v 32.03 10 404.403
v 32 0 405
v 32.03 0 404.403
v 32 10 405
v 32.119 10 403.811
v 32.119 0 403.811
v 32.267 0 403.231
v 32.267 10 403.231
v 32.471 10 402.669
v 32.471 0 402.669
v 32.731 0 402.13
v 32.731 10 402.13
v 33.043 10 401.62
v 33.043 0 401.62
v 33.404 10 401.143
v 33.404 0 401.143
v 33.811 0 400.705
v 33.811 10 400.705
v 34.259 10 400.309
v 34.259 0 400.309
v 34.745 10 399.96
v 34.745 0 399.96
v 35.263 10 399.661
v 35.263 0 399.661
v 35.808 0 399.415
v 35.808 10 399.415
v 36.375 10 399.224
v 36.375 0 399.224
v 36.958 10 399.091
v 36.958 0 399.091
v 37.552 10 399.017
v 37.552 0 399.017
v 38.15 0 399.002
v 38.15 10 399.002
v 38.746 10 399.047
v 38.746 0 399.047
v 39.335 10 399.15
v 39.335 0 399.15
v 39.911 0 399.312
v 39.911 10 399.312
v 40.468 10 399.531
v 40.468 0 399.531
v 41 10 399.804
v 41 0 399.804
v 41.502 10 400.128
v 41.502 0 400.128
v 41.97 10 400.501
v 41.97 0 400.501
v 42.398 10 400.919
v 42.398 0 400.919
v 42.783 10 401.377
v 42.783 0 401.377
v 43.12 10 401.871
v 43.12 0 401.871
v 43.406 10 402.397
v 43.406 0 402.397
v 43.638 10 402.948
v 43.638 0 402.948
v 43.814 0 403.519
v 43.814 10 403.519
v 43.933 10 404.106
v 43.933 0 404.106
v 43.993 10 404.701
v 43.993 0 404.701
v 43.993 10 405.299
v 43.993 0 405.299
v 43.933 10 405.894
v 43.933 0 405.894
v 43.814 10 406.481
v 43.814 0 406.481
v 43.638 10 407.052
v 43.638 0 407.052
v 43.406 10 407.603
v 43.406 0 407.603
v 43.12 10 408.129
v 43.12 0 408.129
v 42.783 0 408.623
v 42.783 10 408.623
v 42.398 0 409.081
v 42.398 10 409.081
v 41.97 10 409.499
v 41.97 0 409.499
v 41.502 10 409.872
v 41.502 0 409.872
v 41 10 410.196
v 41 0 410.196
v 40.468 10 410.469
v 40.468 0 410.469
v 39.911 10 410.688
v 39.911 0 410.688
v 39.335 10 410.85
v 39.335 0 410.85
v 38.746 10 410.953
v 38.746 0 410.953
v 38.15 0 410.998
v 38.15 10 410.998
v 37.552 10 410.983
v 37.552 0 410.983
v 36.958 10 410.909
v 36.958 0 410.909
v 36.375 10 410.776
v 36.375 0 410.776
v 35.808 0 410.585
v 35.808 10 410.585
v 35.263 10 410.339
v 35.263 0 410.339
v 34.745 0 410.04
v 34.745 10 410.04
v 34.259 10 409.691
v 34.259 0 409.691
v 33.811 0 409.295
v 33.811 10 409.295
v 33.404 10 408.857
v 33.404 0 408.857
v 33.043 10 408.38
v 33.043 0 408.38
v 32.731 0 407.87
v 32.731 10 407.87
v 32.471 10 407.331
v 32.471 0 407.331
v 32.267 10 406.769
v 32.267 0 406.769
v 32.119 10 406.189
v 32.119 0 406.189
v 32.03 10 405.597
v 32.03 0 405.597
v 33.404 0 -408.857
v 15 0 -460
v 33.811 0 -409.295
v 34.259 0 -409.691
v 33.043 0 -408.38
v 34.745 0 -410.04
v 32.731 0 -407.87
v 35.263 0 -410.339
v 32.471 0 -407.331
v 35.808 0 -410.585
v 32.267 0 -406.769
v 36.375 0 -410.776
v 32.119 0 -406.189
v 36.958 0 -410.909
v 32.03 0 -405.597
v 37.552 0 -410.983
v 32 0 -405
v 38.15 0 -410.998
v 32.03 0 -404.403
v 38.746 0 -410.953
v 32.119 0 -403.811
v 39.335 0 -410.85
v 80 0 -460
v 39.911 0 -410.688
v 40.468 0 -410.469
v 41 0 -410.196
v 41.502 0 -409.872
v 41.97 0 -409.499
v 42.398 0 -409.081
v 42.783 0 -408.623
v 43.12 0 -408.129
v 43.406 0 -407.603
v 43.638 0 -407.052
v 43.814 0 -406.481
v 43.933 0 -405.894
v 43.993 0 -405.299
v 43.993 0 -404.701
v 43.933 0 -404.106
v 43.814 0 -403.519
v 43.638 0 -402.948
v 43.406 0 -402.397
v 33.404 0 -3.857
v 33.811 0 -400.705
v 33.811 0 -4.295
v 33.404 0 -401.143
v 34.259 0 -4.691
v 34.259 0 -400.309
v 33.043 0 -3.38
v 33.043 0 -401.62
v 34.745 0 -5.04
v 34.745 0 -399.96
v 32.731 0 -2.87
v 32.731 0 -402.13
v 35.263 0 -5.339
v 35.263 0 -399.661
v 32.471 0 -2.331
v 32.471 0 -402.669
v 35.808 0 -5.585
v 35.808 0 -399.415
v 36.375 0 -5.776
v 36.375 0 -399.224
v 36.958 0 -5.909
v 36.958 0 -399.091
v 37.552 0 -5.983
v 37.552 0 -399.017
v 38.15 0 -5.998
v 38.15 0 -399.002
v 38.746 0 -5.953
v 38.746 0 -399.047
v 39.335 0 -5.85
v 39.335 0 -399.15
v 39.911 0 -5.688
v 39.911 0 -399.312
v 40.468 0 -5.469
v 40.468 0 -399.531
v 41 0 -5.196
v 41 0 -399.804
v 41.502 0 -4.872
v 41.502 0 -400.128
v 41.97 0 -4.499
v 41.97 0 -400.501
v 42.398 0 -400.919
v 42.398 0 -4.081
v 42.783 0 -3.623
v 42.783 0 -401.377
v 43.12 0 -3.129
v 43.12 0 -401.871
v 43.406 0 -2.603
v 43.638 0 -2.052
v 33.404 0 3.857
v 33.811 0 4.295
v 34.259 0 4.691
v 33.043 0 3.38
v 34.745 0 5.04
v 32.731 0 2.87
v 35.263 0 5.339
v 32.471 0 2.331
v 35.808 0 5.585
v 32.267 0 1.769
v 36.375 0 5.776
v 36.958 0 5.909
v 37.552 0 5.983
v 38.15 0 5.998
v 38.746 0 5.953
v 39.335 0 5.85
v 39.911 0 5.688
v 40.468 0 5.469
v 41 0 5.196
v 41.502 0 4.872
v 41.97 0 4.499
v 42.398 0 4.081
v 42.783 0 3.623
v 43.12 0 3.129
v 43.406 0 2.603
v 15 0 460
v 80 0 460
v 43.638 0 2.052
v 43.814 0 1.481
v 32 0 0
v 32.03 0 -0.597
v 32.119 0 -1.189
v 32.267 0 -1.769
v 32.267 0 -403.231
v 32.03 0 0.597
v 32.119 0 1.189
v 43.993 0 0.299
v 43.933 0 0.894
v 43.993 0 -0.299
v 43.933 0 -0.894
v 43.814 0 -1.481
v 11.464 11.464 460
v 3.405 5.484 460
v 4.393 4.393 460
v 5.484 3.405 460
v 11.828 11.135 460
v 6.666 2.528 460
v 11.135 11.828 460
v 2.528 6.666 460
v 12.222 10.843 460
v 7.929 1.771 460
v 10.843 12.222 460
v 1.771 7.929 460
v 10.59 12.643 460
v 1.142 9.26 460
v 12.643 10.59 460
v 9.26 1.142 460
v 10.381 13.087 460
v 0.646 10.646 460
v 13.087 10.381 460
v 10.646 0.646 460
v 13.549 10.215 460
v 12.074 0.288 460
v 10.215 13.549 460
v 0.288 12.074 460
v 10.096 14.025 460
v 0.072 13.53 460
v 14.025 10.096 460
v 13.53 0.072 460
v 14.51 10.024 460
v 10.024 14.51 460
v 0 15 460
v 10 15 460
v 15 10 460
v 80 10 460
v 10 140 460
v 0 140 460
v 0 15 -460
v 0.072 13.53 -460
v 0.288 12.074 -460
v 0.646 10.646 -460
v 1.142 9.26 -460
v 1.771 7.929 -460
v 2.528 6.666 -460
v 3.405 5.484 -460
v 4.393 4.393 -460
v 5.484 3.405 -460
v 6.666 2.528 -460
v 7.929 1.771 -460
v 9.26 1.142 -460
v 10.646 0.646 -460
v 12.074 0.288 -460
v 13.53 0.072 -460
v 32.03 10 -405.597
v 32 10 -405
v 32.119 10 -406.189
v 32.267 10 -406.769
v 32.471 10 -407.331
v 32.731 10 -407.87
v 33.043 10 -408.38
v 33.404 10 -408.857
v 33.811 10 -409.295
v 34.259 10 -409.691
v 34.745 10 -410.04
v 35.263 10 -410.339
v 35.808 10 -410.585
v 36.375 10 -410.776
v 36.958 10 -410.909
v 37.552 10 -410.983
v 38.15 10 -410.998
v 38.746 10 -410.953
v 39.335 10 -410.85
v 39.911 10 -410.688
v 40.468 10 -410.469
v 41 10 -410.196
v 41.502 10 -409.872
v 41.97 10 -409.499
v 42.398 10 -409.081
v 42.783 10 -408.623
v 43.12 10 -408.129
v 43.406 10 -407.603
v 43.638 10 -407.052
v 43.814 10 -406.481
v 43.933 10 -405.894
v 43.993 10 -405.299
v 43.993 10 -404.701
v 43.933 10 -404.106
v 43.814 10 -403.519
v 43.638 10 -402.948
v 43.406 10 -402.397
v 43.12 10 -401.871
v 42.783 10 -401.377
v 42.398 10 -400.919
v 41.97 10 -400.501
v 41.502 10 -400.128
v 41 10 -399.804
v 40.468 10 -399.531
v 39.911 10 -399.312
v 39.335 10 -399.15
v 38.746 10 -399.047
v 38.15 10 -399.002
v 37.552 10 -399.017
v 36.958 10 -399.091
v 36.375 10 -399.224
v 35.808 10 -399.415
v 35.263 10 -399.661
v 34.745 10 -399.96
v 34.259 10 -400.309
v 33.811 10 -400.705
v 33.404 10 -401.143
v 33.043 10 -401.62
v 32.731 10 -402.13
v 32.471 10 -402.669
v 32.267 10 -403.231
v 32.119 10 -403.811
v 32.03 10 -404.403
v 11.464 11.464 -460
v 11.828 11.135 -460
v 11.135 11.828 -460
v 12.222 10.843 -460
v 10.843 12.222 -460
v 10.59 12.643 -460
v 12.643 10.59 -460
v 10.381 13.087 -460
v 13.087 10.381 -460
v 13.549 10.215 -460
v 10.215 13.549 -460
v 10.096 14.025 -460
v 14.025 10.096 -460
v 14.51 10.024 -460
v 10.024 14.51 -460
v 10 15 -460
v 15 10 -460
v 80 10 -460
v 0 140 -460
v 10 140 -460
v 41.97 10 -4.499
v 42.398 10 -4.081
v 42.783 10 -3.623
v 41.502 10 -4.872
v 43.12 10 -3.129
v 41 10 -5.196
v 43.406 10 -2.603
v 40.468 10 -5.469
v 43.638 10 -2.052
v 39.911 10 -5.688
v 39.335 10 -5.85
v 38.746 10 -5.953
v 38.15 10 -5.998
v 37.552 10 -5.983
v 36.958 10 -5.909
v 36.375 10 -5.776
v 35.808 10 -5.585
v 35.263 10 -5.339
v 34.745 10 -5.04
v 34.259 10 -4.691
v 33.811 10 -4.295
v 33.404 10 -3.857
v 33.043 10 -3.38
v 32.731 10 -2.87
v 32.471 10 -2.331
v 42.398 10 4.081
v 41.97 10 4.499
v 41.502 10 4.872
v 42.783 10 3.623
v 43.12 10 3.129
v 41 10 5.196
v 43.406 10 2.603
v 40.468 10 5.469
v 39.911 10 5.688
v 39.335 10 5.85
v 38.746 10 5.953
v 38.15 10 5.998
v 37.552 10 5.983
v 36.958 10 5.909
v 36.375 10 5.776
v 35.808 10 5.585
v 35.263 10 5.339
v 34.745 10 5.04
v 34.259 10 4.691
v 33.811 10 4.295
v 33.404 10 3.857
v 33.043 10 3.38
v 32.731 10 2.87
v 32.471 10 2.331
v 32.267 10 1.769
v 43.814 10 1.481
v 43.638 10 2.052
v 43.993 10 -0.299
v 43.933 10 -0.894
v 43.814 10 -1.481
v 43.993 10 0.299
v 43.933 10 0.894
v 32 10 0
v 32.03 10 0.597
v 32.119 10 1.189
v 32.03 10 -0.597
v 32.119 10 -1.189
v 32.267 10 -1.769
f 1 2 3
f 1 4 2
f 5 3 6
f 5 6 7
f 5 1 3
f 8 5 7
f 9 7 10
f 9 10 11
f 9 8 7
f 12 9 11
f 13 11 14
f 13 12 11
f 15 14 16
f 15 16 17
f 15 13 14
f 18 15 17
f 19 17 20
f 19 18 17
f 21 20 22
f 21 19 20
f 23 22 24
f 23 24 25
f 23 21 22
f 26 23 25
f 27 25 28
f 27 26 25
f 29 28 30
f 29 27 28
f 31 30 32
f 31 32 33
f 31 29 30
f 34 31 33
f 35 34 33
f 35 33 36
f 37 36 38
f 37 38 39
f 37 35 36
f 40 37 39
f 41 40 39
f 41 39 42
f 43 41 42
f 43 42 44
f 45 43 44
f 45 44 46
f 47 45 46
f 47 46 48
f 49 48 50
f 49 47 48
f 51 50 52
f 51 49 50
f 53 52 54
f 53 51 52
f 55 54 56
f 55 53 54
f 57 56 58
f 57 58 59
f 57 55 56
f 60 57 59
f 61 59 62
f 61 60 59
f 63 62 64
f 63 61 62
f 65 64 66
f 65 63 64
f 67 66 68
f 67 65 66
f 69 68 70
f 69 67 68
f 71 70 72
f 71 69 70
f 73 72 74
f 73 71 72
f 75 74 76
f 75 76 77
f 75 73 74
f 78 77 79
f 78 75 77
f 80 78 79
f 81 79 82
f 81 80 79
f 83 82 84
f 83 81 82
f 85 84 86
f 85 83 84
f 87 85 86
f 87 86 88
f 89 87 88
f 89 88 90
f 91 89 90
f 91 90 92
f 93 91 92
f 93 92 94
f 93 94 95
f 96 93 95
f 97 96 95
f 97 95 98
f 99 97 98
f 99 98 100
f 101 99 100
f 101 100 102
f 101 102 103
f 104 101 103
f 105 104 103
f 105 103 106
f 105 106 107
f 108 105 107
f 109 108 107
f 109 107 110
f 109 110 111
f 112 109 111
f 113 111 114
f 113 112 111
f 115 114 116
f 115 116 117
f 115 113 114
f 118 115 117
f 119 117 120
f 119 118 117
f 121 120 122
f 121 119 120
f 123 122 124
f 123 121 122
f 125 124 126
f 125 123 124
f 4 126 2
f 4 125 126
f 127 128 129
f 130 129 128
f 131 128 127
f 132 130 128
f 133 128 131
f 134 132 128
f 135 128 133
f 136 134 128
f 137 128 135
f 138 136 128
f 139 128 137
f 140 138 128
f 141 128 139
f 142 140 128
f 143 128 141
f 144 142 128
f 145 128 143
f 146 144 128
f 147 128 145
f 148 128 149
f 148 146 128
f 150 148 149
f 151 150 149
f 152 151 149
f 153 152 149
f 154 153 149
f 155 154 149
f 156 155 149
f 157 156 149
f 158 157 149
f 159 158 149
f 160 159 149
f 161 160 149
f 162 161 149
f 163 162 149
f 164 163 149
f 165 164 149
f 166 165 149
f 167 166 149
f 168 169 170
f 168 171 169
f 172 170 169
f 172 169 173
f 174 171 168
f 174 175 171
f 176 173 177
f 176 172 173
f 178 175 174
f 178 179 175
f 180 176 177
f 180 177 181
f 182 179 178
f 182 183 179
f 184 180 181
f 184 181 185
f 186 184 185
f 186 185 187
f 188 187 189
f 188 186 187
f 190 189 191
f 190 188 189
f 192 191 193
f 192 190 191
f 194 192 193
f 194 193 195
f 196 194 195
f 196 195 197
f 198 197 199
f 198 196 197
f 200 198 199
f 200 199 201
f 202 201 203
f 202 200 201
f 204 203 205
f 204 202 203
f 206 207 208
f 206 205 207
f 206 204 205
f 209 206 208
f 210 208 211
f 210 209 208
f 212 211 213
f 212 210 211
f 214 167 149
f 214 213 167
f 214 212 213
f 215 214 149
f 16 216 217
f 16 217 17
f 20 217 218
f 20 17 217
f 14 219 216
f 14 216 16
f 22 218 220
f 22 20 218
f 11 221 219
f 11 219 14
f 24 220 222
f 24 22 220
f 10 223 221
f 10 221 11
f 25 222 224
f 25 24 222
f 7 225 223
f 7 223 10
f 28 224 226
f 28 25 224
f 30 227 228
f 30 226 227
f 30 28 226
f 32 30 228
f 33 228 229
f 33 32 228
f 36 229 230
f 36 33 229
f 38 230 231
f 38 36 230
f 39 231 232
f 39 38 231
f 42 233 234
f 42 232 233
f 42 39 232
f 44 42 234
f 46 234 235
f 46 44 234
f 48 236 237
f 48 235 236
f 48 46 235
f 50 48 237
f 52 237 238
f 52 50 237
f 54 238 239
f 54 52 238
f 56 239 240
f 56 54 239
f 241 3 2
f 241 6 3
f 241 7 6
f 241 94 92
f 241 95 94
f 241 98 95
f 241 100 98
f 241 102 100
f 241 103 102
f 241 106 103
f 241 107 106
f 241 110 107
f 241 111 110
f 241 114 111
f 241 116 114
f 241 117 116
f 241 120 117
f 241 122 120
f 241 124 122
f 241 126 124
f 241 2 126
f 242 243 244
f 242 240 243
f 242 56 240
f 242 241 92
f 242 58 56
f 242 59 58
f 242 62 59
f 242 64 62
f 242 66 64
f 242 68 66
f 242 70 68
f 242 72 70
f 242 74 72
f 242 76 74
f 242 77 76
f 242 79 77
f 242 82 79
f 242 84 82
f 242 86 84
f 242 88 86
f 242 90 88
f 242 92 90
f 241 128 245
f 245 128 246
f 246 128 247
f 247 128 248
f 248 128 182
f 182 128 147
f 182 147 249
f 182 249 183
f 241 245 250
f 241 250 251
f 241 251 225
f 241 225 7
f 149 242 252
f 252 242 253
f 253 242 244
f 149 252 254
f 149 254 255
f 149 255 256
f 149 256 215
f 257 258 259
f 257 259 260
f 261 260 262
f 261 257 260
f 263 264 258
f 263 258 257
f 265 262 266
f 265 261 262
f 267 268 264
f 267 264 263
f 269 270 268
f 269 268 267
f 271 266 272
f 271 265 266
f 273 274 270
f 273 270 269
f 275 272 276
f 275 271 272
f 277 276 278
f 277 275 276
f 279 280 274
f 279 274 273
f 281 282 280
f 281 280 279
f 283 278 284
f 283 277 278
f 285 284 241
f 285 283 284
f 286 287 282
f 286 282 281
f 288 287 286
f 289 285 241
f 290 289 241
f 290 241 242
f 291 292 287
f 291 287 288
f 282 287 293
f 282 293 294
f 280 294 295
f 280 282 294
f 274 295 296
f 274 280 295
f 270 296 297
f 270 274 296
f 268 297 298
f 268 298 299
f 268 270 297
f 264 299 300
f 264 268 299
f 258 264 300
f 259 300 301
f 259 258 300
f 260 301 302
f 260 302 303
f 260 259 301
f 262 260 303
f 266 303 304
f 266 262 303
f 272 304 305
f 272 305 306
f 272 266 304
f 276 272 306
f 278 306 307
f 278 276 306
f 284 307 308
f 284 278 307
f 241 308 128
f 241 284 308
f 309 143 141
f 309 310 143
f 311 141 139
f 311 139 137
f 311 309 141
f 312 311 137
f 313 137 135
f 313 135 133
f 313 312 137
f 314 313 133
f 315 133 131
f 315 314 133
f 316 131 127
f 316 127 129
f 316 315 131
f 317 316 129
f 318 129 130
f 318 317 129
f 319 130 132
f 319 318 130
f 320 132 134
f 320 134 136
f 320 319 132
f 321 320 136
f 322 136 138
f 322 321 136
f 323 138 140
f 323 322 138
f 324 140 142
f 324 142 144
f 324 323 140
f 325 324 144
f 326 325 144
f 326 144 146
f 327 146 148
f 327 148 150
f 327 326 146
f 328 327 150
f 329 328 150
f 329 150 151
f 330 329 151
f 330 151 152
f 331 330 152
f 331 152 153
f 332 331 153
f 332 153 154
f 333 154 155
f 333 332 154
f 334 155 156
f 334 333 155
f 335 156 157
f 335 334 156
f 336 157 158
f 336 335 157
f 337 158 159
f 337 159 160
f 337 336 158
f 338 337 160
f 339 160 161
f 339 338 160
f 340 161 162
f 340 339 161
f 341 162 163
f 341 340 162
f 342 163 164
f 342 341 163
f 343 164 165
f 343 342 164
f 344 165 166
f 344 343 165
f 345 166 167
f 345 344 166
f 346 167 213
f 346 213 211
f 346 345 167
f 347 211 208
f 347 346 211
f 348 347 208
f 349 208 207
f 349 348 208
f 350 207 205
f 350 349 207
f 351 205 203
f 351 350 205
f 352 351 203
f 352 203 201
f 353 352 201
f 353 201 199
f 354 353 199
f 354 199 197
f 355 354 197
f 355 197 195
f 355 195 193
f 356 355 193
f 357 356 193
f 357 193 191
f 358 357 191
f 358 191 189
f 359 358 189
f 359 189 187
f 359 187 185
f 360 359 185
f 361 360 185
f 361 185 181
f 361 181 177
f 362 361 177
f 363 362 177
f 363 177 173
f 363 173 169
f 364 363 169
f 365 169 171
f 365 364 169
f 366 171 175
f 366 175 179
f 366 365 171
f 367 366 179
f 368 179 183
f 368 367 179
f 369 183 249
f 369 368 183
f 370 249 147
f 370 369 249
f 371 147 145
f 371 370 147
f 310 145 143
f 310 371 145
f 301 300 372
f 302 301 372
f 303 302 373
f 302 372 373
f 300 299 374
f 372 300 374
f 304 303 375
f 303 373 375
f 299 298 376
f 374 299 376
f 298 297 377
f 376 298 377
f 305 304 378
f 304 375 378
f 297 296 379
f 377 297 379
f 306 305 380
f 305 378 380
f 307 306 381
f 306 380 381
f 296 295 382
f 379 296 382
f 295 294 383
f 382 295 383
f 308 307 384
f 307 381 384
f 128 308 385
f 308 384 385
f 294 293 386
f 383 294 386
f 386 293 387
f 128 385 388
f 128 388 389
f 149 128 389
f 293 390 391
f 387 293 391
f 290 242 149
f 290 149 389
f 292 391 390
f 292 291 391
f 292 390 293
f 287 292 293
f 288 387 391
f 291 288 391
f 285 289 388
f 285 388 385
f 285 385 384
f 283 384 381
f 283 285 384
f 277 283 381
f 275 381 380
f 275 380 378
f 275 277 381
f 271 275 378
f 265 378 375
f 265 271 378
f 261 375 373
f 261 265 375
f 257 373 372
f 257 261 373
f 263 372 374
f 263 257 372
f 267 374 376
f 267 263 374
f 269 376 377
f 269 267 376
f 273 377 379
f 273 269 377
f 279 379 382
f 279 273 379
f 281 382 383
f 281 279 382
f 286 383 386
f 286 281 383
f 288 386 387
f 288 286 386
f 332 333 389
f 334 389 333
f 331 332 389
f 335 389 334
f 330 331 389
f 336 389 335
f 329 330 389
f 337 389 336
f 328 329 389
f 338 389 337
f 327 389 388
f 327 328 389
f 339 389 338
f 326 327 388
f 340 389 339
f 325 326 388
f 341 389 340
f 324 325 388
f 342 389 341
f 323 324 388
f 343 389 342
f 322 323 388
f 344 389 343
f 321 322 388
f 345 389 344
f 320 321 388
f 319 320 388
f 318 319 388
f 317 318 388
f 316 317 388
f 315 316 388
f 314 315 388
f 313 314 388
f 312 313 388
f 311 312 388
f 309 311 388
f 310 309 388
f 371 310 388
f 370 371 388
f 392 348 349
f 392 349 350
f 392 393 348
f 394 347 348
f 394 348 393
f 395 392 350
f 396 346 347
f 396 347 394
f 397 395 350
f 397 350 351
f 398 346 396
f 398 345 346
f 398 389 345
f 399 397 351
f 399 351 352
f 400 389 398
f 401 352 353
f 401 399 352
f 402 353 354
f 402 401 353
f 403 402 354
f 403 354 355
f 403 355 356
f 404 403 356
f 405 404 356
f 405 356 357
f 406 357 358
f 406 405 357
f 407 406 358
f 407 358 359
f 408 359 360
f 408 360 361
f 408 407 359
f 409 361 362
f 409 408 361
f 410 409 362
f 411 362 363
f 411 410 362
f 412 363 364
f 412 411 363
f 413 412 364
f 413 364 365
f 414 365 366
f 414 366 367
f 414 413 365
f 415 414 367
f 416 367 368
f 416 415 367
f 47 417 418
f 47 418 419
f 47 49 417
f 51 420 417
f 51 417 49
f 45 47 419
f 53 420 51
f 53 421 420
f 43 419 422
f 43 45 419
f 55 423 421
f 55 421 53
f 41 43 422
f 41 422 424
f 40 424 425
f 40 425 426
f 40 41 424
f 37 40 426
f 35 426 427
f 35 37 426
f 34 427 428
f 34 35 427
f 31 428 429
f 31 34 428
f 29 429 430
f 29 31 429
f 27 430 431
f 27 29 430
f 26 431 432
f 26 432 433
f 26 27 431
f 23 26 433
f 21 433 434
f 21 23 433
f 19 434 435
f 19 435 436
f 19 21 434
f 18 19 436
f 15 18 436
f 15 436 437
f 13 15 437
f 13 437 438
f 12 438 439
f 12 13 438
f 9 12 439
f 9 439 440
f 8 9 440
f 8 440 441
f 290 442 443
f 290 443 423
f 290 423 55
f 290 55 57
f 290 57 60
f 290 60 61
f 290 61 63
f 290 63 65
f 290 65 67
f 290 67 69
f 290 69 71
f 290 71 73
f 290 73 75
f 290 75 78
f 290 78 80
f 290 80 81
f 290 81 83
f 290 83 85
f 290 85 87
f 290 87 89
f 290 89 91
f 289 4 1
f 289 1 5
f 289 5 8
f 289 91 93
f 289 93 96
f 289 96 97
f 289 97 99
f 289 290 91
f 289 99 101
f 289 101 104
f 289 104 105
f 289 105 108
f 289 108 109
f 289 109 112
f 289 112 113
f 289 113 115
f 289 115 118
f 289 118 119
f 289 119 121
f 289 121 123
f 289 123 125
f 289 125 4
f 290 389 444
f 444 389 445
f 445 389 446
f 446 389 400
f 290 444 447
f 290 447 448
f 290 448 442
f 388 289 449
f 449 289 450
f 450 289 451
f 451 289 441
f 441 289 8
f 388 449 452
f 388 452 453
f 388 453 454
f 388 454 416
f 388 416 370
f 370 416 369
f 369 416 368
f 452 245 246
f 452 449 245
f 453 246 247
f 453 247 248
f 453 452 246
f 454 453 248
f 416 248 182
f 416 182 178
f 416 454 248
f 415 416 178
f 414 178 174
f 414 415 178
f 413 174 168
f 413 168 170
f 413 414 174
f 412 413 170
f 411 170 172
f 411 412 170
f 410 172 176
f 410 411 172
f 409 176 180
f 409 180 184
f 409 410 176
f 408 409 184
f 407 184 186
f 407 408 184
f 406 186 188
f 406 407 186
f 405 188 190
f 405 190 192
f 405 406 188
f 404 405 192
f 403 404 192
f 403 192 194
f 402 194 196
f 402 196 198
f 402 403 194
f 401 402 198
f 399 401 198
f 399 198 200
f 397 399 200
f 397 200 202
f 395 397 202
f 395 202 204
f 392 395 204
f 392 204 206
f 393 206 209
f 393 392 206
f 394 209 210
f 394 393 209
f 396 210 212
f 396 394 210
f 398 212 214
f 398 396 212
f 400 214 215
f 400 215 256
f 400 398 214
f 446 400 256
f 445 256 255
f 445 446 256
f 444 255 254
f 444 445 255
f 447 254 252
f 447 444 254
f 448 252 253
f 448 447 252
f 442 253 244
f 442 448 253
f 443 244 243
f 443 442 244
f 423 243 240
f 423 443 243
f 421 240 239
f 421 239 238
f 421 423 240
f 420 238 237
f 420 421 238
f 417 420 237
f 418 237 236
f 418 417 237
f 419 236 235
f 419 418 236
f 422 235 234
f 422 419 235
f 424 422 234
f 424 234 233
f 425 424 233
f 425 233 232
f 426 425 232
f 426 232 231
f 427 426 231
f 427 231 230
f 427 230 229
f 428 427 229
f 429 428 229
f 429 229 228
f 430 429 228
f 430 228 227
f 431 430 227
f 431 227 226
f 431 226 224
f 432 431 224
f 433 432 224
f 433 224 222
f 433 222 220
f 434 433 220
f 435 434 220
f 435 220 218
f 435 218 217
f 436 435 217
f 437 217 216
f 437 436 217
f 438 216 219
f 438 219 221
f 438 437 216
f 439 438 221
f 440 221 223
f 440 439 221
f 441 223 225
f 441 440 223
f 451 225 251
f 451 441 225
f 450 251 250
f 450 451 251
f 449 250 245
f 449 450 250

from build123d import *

# Parameters (mm, degrees)
EXTRUDE_1_DEPTH            = 460
SKETCH_2_W                 = 6
SKETCH_2_H                 = 10
PATTERN_LINEAR_1_COUNT     = 2
PATTERN_LINEAR_1_PITCH     = 405
PATTERN_LINEAR_1_COL_COUNT = 2
PATTERN_LINEAR_1_COL_PITCH = 405


with BuildPart() as part:
    # 草图1 → 凸台-拉伸1 (new, symmetric)
    with BuildSketch(Plane.XY):
        with BuildLine():
            Line((0, 140), (0, 15))
            ThreePointArc((0, 15), (4.393398282, 4.393398282), (15, 0))
            Line((15, 0), (80, 0))
            Line((80, 0), (80, 10))
            Line((80, 10), (15, 10))
            ThreePointArc((15, 10), (11.464466094, 11.464466094), (10, 15))
            Line((10, 15), (10, 140))
            Line((10, 140), (0, 140))
        make_face()
    extrude(amount=EXTRUDE_1_DEPTH, both=True)

    # 草图2 → 切除-旋转1 (revolve, cut)
    with BuildSketch(Plane.XY, mode=Mode.PRIVATE) as cut_revolve_1_sk:
        with Locations((41, 5)):
            Rectangle(SKETCH_2_W, SKETCH_2_H)
    cut_revolve_1 = revolve(cut_revolve_1_sk.sketch.rotate(Axis((38, 38.728286981, 0), (0, -1, 0)), 180), axis=Axis((38, 38.728286981, 0), (0, -1, 0)), mode=Mode.SUBTRACT)

    # 阵列(线性)1: 切除-旋转1 ×2
    with Locations(*[(0, 0, i * PATTERN_LINEAR_1_PITCH) for i in range(1, PATTERN_LINEAR_1_COUNT)]):
        add(cut_revolve_1, mode=Mode.SUBTRACT)

    # 阵列(线性)1 col: 切除-旋转1 ×2
    with Locations(*[(0, 0, -i * PATTERN_LINEAR_1_COL_PITCH) for i in range(1, PATTERN_LINEAR_1_COL_COUNT)]):
        add(cut_revolve_1, mode=Mode.SUBTRACT)


solid = part.part
